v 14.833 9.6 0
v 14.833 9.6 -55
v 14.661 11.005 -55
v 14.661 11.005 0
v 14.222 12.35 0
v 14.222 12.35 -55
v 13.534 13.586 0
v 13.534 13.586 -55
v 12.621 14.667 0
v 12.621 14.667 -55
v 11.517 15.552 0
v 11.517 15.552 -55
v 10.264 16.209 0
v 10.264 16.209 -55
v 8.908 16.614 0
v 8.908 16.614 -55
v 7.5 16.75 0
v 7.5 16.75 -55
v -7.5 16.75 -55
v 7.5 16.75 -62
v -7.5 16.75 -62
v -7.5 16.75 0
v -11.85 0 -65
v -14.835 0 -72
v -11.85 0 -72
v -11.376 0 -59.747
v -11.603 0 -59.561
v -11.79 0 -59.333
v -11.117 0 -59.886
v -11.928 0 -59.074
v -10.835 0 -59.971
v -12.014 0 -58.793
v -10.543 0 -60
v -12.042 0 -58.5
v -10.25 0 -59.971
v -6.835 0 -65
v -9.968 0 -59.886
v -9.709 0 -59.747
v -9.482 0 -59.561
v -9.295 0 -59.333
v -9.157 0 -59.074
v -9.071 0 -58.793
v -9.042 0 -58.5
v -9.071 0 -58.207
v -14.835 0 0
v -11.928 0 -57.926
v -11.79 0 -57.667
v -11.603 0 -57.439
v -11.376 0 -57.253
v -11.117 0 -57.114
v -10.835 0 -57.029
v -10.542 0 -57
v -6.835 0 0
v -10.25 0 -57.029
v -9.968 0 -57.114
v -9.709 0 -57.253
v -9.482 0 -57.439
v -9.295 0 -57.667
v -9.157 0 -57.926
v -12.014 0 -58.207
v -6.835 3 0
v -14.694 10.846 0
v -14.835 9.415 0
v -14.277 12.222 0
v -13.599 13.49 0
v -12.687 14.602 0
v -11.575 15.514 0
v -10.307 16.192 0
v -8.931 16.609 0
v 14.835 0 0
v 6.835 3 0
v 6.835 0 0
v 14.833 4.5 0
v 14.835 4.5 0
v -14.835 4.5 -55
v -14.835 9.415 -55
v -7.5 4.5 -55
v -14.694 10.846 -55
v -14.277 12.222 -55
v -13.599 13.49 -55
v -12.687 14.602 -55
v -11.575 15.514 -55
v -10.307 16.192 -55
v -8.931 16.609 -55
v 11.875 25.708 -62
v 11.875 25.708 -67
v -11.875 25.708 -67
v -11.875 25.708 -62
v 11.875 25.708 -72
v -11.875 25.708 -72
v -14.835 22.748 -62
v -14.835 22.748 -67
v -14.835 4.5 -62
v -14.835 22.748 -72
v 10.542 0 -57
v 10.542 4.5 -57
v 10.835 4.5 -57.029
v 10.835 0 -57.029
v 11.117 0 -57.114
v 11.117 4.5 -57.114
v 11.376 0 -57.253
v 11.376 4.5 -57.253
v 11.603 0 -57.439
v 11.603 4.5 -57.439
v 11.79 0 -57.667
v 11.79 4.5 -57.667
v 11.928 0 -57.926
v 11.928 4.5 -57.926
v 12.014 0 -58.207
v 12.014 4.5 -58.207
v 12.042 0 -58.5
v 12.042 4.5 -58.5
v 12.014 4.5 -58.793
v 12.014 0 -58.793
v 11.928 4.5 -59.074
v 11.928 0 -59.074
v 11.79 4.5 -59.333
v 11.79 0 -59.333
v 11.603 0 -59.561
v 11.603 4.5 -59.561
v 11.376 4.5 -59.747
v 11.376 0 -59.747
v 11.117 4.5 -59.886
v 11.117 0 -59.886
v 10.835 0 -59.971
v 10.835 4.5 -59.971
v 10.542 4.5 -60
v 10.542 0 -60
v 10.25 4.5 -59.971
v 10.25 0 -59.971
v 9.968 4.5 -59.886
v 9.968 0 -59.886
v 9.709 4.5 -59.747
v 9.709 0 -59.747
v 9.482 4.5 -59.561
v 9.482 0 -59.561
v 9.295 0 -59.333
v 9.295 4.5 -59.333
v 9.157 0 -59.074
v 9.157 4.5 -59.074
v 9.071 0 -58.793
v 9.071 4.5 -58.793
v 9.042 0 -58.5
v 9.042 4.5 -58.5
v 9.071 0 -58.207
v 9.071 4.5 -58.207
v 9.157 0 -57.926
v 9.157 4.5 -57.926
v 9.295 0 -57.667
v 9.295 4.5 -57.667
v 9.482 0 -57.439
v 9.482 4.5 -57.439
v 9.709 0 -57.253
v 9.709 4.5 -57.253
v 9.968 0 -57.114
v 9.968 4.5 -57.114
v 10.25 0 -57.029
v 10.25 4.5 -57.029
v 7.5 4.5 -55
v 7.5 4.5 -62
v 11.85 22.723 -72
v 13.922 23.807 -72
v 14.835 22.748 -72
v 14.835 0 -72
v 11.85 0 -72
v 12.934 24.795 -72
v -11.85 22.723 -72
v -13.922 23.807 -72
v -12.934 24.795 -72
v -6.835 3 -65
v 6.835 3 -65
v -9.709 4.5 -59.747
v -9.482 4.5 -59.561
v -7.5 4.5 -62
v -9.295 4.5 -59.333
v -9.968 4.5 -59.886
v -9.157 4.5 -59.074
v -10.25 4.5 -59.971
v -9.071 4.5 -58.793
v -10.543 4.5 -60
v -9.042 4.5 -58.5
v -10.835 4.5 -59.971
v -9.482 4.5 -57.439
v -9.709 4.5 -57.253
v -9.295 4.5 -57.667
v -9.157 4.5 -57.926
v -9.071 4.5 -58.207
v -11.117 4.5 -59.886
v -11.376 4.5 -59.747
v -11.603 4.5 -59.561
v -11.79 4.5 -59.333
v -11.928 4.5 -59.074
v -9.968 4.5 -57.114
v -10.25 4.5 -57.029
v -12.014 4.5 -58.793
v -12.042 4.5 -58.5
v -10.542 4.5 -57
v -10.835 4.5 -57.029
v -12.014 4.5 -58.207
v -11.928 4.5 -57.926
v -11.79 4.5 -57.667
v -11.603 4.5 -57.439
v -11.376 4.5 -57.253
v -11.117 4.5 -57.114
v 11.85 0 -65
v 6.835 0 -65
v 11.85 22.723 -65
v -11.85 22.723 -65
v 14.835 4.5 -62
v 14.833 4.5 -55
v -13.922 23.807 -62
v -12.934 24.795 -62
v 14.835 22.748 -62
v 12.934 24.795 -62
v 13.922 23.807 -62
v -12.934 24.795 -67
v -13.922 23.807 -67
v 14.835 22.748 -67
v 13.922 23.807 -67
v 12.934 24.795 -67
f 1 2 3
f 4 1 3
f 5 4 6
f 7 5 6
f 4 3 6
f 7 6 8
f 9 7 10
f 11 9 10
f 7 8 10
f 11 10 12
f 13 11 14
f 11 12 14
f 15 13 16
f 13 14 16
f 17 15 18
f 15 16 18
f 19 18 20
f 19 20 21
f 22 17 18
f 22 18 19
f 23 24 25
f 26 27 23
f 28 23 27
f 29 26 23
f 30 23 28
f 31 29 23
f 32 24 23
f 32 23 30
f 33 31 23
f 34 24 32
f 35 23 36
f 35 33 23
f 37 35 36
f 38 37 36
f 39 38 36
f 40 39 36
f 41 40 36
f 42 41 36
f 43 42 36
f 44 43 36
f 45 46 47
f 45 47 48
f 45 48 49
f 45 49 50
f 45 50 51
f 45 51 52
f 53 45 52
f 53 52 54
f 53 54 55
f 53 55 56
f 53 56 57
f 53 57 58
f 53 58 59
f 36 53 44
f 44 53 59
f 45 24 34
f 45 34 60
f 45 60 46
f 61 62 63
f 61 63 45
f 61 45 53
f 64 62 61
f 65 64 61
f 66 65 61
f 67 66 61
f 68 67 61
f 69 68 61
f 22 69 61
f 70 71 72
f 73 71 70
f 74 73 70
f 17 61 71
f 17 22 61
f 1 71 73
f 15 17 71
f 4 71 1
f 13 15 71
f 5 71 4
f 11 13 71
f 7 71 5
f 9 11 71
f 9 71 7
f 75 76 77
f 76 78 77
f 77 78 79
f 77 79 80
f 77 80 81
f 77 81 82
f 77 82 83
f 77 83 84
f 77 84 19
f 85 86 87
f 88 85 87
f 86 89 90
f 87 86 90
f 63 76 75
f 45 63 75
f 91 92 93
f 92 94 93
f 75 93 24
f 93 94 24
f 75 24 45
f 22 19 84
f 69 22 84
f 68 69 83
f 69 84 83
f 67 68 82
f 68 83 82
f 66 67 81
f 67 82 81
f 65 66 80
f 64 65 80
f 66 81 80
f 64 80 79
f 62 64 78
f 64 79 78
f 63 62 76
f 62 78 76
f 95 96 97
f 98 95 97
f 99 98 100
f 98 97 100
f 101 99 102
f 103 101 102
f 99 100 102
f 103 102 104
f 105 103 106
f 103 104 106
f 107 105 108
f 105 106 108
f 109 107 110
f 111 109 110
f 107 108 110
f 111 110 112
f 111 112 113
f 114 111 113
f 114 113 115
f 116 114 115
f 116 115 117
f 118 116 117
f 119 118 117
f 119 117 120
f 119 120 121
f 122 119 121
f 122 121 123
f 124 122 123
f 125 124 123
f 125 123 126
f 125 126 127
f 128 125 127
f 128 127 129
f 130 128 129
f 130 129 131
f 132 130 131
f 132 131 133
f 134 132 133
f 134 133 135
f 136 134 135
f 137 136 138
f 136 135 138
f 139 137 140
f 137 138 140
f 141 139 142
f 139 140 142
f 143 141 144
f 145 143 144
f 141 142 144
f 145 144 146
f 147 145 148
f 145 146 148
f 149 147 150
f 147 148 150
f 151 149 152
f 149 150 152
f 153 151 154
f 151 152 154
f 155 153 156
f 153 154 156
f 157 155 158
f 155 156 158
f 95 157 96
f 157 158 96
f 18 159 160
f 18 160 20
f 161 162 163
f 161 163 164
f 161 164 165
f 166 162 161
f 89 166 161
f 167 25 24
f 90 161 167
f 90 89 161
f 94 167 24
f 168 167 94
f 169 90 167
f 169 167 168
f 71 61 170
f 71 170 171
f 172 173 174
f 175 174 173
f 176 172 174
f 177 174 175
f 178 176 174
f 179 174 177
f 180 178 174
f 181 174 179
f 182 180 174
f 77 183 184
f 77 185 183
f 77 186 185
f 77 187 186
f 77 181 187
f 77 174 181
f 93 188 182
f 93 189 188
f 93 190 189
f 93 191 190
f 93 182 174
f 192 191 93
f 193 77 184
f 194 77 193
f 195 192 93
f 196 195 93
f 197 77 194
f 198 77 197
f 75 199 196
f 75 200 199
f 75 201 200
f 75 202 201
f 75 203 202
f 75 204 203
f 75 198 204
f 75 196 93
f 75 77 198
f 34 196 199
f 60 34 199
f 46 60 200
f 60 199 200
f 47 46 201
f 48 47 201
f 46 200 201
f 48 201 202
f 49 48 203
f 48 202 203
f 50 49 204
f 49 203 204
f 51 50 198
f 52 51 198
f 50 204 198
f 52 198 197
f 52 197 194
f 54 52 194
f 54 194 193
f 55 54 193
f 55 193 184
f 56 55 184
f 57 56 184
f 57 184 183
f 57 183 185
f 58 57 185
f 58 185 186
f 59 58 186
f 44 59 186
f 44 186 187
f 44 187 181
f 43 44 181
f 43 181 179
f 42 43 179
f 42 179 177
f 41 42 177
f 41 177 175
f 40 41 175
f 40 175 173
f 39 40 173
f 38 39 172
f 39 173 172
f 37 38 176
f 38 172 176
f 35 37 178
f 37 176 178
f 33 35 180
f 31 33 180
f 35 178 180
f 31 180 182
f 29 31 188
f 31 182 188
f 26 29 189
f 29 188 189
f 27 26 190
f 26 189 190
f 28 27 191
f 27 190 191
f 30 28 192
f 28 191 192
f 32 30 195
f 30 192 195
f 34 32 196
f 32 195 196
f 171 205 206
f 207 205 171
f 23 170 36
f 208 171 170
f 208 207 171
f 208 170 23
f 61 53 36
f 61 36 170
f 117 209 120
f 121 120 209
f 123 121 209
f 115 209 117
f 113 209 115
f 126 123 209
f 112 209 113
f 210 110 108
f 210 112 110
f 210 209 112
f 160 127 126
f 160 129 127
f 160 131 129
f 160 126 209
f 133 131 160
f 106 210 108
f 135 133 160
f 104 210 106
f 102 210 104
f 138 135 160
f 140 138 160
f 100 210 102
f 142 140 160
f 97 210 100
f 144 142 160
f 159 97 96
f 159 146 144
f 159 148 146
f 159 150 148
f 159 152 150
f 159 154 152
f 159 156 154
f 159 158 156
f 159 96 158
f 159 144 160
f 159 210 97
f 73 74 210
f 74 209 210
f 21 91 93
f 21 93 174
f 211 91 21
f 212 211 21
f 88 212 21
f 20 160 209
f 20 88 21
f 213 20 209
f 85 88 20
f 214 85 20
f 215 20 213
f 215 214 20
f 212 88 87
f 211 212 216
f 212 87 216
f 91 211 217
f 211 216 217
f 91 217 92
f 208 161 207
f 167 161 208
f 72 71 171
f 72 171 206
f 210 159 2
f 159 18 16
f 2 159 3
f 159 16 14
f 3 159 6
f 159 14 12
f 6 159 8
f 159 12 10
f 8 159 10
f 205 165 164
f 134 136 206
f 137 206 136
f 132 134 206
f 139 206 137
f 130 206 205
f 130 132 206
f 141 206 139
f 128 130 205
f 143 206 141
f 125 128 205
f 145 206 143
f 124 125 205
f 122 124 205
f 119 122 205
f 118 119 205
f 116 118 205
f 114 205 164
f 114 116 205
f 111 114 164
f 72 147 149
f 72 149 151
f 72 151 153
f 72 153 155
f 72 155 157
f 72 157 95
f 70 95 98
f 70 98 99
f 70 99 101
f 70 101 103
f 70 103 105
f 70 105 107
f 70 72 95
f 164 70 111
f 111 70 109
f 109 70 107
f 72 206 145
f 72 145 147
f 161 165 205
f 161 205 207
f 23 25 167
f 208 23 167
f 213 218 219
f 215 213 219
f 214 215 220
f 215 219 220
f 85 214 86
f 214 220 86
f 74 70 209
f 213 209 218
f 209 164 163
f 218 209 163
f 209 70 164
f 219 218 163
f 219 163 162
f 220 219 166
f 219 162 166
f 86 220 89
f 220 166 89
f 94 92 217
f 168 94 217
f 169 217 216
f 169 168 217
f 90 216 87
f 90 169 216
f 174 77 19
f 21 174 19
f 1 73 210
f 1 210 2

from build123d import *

# Parameters (mm, degrees)
BOSS_EXTRUDE1_DEPTH = 72
BOSS_EXTRUDE3_DEPTH = 5
CUT_EXTRUDE4_DEPTH  = 5
BOSS_EXTRUDE4_DEPTH = 5
BOSS_EXTRUDE5_START = 7
BOSS_EXTRUDE5_DEPTH = 55
CUT_EXTRUDE8_DEPTH  = 5
SKETCH19_W          = 15
SKETCH19_H          = 12.25
BOSS_EXTRUDE8_DEPTH = 7
CUT_EXTRUDE9_REACH  = 78.51
SKETCH20_R          = 1.5
SKETCH21_W          = 23.7
SKETCH21_H          = 22.72285099
CUT_EXTRUDE10_DEPTH = 7


with BuildPart() as part:
    # Sketch1 → Boss-Extrude1 (new body)
    with BuildSketch(Plane.XY):
        Polygon((-14.835, 0), (-6.835, 0), (-6.835, 3), (6.835, 3), (6.835, 0), (14.835, 0), (14.835, 4.5), (8.35, 4.5), (-8.35, 4.5), (-14.835, 4.5), align=None)
    extrude(amount=-BOSS_EXTRUDE1_DEPTH)

    # Sketch8 → Boss-Extrude3 (add)
    with BuildSketch(Plane(origin=(0, 0, -72), x_dir=(-1, 0, 0), z_dir=(0, 0, -1))):
        Polygon((-14.835, 25.70785099), (-14.835, 0), (-10.35, 0), (-10.35, 21.22285099), (10.35, 21.22285099), (10.35, 0), (14.835, 0), (14.835, 25.70785099), align=None)
    extrude(amount=-BOSS_EXTRUDE3_DEPTH)

    # Sketch9 → Cut-Extrude4 (cut)
    with BuildSketch(Plane(origin=(0, 0, -72), x_dir=(-1, 0, 0), z_dir=(0, 0, -1))):
        with BuildLine():
            Line((-15.009070225, 25.881921215), (-15.009070225, 22.527488279))
            ThreePointArc((-15.009070225, 22.527488279), (-13.436955933, 24.309806923), (-11.654637289, 25.881921215))
            Line((-11.654637289, 25.881921215), (-15.009070225, 25.881921215))
        make_face()
        with BuildLine():
            Line((15.009070225, 25.881921215), (15.009070225, 22.527488279))
            ThreePointArc((15.009070225, 22.527488279), (13.436955933, 24.309806923), (11.654637289, 25.881921215))
            Line((11.654637289, 25.881921215), (15.009070225, 25.881921215))
        make_face()
    extrude(amount=-CUT_EXTRUDE4_DEPTH, mode=Mode.SUBTRACT)

    # Sketch11 → Boss-Extrude4 (add)
    with BuildSketch(Plane.XY.offset(-67)):
        with BuildLine():
            Line((14.835, 4.5), (14.835, 22.748275799))
            ThreePointArc((14.835, 22.748275799), (13.436955933, 24.309806923), (11.875424809, 25.70785099))
            Line((11.875424809, 25.70785099), (-11.875424809, 25.70785099))
            ThreePointArc((-11.875424809, 25.70785099), (-13.436955933, 24.309806923), (-14.835, 22.748275799))
            Line((-14.835, 22.748275799), (-14.835, 4.5))
            Line((-14.835, 4.5), (14.835, 4.5))
        make_face()
    extrude(amount=BOSS_EXTRUDE4_DEPTH)

    # Sketch12 → Boss-Extrude5 (add)
    with BuildSketch(Plane.XY.offset(-62).offset(BOSS_EXTRUDE5_START)):
        with BuildLine():
            Line((-14.835, 4.5), (14.832662348, 4.5))
            Line((14.832662348, 4.5), (14.832662348, 9.600169894))
            ThreePointArc((14.832662348, 9.600169894), (12.620742321, 14.666687642), (7.5, 16.75))
            Line((7.5, 16.75), (-7.5, 16.75))
            ThreePointArc((-7.5, 16.75), (-12.68662824, 14.60162824), (-14.835, 9.415))
            Line((-14.835, 9.415), (-14.835, 4.5))
        make_face()
    extrude(amount=BOSS_EXTRUDE5_DEPTH)

    # Sketch18 → Cut-Extrude8 (cut)
    with BuildSketch(Plane(origin=(0, 0, -72), x_dir=(-1, 0, 0), z_dir=(0, 0, -1))):
        Polygon((-10.35, 4.5), (-10.35, 0), (-6.835, 0), (-6.835, 3), (6.835, 3), (6.835, 0), (10.35, 0), (10.35, 4.5), align=None)
    extrude(amount=-CUT_EXTRUDE8_DEPTH, mode=Mode.SUBTRACT)

    # Sketch19 → Boss-Extrude8 (add)
    with BuildSketch(Plane(origin=(0, 0, -55), x_dir=(-1, 0, 0), z_dir=(0, 0, -1))):
        with Locations((0, 10.625)):
            Rectangle(SKETCH19_W, SKETCH19_H)
    extrude(amount=BOSS_EXTRUDE8_DEPTH)

    # Sketch20 → Cut-Extrude9 (cut, up to next)
    with BuildSketch(Plane(origin=(0, 4.5, 0), x_dir=(1, 0, 0), z_dir=(0, 1, 0)), mode=Mode.PRIVATE) as cut_extrude9_sk1:
        with Locations(Location((-10.5425, 58.5, 0), (0, 0, 180))):
            Circle(SKETCH20_R)
    cut_extrude9_tool1 = extrude(cut_extrude9_sk1.sketch, amount=-CUT_EXTRUDE9_REACH, mode=Mode.PRIVATE) & part.part
    # Sketch20 → Cut-Extrude9 (cut, up to next)
    with BuildSketch(Plane(origin=(0, 4.5, 0), x_dir=(1, 0, 0), z_dir=(0, 1, 0)), mode=Mode.PRIVATE) as cut_extrude9_sk2:
        with Locations(Location((10.5425, 58.5, 0), (0, 0, 270))):
            Circle(SKETCH20_R)
    cut_extrude9_tool2 = extrude(cut_extrude9_sk2.sketch, amount=-CUT_EXTRUDE9_REACH, mode=Mode.PRIVATE) & part.part
    add(cut_extrude9_tool1.solids().sort_by_distance((-10.5425, 4.5, -58.5))[0], mode=Mode.SUBTRACT)
    add(cut_extrude9_tool2.solids().sort_by_distance((10.5425, 4.5, -58.5))[0], mode=Mode.SUBTRACT)

    # Sketch21 → Cut-Extrude10 (cut)
    with BuildSketch(Plane(origin=(0, 0, -72), x_dir=(-1, 0, 0), z_dir=(0, 0, -1))):
        with Locations((0, 11.361425495)):
            Rectangle(SKETCH21_W, SKETCH21_H)
    extrude(amount=-CUT_EXTRUDE10_DEPTH, mode=Mode.SUBTRACT)


solid = part.part
